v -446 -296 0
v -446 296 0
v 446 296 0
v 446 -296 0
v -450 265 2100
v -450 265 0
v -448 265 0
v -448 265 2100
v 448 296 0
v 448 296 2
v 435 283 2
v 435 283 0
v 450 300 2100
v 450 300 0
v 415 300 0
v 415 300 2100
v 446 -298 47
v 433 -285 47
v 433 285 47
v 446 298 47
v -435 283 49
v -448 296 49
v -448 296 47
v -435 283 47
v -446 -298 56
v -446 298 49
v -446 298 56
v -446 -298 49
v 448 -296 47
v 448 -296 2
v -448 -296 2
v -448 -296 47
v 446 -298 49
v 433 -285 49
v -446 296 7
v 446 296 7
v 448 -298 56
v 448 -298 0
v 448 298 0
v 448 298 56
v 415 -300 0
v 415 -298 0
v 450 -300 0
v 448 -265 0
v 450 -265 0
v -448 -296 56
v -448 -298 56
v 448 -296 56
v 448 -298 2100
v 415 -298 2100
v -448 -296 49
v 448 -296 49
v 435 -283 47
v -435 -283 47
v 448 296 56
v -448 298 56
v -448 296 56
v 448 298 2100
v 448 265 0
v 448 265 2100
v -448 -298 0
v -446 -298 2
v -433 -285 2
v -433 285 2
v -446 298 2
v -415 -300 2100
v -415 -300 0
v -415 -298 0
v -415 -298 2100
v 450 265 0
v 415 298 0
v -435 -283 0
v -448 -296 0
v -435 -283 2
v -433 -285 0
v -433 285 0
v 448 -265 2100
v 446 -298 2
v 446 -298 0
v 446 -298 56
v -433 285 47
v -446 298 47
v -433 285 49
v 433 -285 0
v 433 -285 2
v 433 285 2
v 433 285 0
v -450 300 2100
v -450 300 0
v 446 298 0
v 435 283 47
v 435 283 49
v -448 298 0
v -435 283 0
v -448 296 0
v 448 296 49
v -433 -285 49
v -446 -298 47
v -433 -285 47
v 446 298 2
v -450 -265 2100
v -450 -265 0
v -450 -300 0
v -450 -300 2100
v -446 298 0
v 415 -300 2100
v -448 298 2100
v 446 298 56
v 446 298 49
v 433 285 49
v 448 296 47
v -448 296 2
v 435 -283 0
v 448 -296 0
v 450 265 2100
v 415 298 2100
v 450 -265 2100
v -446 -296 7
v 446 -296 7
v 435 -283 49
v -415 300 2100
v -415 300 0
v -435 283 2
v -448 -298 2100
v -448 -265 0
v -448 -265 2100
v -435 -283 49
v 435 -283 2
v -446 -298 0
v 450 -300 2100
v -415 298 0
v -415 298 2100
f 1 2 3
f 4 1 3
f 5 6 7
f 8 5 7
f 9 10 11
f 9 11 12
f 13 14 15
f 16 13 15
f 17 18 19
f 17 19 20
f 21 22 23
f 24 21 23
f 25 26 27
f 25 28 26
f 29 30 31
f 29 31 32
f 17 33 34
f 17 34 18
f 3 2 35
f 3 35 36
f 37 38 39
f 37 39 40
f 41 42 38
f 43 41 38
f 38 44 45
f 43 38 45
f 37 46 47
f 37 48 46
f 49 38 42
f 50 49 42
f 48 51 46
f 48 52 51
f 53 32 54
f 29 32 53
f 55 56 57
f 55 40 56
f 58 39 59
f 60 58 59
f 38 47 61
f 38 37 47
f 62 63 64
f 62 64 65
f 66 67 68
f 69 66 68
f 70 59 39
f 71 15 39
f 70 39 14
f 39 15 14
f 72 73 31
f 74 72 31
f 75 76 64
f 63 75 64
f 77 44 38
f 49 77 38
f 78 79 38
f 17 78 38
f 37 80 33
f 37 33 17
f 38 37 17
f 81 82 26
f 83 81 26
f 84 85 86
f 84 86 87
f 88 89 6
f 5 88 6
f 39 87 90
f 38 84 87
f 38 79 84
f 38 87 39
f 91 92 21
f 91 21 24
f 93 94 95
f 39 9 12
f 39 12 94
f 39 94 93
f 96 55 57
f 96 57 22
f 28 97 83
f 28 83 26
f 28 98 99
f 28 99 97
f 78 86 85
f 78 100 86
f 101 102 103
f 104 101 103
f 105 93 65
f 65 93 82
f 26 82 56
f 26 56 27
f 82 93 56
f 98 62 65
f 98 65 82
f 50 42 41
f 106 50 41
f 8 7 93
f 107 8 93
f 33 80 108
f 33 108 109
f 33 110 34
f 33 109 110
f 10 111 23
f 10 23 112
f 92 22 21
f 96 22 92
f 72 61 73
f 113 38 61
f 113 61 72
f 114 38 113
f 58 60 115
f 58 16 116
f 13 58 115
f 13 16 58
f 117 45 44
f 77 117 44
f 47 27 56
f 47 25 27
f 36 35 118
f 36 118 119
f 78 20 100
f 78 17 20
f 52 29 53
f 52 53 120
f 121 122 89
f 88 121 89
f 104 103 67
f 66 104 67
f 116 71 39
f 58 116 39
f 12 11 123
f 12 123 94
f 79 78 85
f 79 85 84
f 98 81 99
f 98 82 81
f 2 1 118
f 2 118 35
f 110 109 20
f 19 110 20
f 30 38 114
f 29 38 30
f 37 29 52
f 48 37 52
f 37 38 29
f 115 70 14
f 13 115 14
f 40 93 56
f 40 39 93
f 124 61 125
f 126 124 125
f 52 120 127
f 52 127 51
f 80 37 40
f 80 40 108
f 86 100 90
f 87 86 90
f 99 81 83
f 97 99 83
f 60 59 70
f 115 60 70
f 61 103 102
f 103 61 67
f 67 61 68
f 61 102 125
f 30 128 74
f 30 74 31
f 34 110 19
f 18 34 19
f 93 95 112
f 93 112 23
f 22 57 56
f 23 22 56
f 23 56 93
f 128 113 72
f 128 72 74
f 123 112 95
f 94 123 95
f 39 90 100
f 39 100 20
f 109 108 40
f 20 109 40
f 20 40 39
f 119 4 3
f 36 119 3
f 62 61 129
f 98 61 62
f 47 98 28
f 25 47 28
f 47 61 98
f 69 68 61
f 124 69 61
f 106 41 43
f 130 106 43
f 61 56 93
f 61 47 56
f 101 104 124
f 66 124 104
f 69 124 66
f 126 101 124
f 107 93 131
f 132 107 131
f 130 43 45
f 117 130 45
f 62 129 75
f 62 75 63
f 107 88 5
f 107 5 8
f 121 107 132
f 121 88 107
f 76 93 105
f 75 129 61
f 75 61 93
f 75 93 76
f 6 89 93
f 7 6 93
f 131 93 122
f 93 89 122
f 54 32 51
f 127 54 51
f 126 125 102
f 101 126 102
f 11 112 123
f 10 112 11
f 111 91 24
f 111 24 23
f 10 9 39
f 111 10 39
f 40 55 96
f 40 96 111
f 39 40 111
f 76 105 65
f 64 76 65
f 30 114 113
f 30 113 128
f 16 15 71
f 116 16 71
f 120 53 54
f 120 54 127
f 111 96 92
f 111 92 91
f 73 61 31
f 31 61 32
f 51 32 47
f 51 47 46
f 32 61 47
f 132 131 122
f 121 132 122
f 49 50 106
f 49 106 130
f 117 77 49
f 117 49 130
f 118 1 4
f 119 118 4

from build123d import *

# Parameters (mm, degrees)
F1_W       = 892
F1_H       = 592
F2_DEPTH   = 7
F3_DEPTH   = 2100
F5_DEPTH   = 448
F6_SIZE2   = 13
F6_SIZE    = 13
F6_2_SIZE2 = 13
F6_2_SIZE  = 13
F8_DEPTH   = 298
F9_SIZE2   = 13
F9_SIZE    = 13
F9_2_SIZE2 = 13
F9_2_SIZE  = 13


with BuildPart() as f2:
    # F1 (on Top) → F2 (new body)
    with BuildSketch(Plane.XY):
        Rectangle(F1_W, F1_H)
    extrude(amount=F2_DEPTH)


with BuildPart() as f3:
    # F0 (on Top) → F3 (new body)
    with BuildSketch(Plane.XY):
        Polygon((-450, -265), (-450, -300), (-415, -300), (-415, -298), (-448, -298), (-448, -265), align=None)
    extrude(amount=F3_DEPTH)


with BuildPart() as f3b:
    # F0 (on Top) → F3, piece 2 (new body)
    with BuildSketch(Plane.XY):
        Polygon((450, -300), (450, -265), (448, -265), (448, -298), (415, -298), (415, -300), align=None)
    extrude(amount=F3_DEPTH)


with BuildPart() as f3c:
    # F0 (on Top) → F3, piece 3 (new body)
    with BuildSketch(Plane.XY):
        Polygon((448, 265), (450, 265), (450, 300), (415, 300), (415, 298), (448, 298), align=None)
    extrude(amount=F3_DEPTH)


with BuildPart() as f3d:
    # F0 (on Top) → F3, piece 4 (new body)
    with BuildSketch(Plane.XY):
        Polygon((-448, 298), (-415, 298), (-415, 300), (-450, 300), (-450, 265), (-448, 265), align=None)
    extrude(amount=F3_DEPTH)


with BuildPart() as f5:
    # F4 (on Right) → F5 (new body, symmetric)
    with BuildSketch(Plane.YZ):
        Polygon((-298, 56), (-298, 0), (-283, 0), (-283, 2), (-296, 2), (-296, 47), (-283, 47), (-283, 49), (-296, 49), (-296, 56), align=None)
    extrude(amount=F5_DEPTH, both=True)

    # F6#2
    f6_2_edges = [f5.edges().sort_by_distance(p)[0] for p in [
        (448, -283, 48),
        (448, -283, 1),
        (-448, -283, 48),
        (-448, -283, 1),
    ]]
    chamfer(f6_2_edges, length=F6_2_SIZE, length2=F6_2_SIZE2)


with BuildPart() as f5b:
    # F4 (on Right) → F5, piece 2 (new body, symmetric)
    with BuildSketch(Plane.YZ):
        Polygon((298, 56), (296, 56), (296, 49), (283, 49), (283, 47), (296, 47), (296, 2), (283, 2), (283, 0), (298, 0), align=None)
    extrude(amount=F5_DEPTH, both=True)

    # F6
    f6_edges = [f5b.edges().sort_by_distance(p)[0] for p in [
        (-448, 283, 48),
        (-448, 283, 1),
        (448, 283, 48),
        (448, 283, 1),
    ]]
    chamfer(f6_edges, length=F6_SIZE, length2=F6_SIZE2)


with BuildPart() as f8:
    # F7 (on Front) → F8 (new body, symmetric)
    with BuildSketch(Plane.XZ):
        Polygon((-448, 56), (-448, 0), (-433, 0), (-433, 2), (-446, 2), (-446, 47), (-433, 47), (-433, 49), (-446, 49), (-446, 56), align=None)
    extrude(amount=F8_DEPTH, both=True)

    # F9#2
    f9_2_edges = [f8.edges().sort_by_distance(p)[0] for p in [
        (-433, -298, 48),
        (-433, -298, 1),
        (-433, 298, 48),
        (-433, 298, 1),
    ]]
    chamfer(f9_2_edges, length=F9_2_SIZE, length2=F9_2_SIZE2)


with BuildPart() as f8b:
    # F7 (on Front) → F8, piece 2 (new body, symmetric)
    with BuildSketch(Plane.XZ):
        Polygon((446, 2), (433, 2), (433, 0), (448, 0), (448, 56), (446, 56), (446, 49), (433, 49), (433, 47), (446, 47), align=None)
    extrude(amount=F8_DEPTH, both=True)

    # F9
    f9_edges = [f8b.edges().sort_by_distance(p)[0] for p in [
        (433, 298, 48),
        (433, 298, 1),
        (433, -298, 1),
        (433, -298, 48),
    ]]
    chamfer(f9_edges, length=F9_SIZE, length2=F9_SIZE2)


solid = Compound([f2.part, f3.part, f3b.part, f3c.part, f3d.part, f5.part, f5b.part, f8.part, f8b.part])
